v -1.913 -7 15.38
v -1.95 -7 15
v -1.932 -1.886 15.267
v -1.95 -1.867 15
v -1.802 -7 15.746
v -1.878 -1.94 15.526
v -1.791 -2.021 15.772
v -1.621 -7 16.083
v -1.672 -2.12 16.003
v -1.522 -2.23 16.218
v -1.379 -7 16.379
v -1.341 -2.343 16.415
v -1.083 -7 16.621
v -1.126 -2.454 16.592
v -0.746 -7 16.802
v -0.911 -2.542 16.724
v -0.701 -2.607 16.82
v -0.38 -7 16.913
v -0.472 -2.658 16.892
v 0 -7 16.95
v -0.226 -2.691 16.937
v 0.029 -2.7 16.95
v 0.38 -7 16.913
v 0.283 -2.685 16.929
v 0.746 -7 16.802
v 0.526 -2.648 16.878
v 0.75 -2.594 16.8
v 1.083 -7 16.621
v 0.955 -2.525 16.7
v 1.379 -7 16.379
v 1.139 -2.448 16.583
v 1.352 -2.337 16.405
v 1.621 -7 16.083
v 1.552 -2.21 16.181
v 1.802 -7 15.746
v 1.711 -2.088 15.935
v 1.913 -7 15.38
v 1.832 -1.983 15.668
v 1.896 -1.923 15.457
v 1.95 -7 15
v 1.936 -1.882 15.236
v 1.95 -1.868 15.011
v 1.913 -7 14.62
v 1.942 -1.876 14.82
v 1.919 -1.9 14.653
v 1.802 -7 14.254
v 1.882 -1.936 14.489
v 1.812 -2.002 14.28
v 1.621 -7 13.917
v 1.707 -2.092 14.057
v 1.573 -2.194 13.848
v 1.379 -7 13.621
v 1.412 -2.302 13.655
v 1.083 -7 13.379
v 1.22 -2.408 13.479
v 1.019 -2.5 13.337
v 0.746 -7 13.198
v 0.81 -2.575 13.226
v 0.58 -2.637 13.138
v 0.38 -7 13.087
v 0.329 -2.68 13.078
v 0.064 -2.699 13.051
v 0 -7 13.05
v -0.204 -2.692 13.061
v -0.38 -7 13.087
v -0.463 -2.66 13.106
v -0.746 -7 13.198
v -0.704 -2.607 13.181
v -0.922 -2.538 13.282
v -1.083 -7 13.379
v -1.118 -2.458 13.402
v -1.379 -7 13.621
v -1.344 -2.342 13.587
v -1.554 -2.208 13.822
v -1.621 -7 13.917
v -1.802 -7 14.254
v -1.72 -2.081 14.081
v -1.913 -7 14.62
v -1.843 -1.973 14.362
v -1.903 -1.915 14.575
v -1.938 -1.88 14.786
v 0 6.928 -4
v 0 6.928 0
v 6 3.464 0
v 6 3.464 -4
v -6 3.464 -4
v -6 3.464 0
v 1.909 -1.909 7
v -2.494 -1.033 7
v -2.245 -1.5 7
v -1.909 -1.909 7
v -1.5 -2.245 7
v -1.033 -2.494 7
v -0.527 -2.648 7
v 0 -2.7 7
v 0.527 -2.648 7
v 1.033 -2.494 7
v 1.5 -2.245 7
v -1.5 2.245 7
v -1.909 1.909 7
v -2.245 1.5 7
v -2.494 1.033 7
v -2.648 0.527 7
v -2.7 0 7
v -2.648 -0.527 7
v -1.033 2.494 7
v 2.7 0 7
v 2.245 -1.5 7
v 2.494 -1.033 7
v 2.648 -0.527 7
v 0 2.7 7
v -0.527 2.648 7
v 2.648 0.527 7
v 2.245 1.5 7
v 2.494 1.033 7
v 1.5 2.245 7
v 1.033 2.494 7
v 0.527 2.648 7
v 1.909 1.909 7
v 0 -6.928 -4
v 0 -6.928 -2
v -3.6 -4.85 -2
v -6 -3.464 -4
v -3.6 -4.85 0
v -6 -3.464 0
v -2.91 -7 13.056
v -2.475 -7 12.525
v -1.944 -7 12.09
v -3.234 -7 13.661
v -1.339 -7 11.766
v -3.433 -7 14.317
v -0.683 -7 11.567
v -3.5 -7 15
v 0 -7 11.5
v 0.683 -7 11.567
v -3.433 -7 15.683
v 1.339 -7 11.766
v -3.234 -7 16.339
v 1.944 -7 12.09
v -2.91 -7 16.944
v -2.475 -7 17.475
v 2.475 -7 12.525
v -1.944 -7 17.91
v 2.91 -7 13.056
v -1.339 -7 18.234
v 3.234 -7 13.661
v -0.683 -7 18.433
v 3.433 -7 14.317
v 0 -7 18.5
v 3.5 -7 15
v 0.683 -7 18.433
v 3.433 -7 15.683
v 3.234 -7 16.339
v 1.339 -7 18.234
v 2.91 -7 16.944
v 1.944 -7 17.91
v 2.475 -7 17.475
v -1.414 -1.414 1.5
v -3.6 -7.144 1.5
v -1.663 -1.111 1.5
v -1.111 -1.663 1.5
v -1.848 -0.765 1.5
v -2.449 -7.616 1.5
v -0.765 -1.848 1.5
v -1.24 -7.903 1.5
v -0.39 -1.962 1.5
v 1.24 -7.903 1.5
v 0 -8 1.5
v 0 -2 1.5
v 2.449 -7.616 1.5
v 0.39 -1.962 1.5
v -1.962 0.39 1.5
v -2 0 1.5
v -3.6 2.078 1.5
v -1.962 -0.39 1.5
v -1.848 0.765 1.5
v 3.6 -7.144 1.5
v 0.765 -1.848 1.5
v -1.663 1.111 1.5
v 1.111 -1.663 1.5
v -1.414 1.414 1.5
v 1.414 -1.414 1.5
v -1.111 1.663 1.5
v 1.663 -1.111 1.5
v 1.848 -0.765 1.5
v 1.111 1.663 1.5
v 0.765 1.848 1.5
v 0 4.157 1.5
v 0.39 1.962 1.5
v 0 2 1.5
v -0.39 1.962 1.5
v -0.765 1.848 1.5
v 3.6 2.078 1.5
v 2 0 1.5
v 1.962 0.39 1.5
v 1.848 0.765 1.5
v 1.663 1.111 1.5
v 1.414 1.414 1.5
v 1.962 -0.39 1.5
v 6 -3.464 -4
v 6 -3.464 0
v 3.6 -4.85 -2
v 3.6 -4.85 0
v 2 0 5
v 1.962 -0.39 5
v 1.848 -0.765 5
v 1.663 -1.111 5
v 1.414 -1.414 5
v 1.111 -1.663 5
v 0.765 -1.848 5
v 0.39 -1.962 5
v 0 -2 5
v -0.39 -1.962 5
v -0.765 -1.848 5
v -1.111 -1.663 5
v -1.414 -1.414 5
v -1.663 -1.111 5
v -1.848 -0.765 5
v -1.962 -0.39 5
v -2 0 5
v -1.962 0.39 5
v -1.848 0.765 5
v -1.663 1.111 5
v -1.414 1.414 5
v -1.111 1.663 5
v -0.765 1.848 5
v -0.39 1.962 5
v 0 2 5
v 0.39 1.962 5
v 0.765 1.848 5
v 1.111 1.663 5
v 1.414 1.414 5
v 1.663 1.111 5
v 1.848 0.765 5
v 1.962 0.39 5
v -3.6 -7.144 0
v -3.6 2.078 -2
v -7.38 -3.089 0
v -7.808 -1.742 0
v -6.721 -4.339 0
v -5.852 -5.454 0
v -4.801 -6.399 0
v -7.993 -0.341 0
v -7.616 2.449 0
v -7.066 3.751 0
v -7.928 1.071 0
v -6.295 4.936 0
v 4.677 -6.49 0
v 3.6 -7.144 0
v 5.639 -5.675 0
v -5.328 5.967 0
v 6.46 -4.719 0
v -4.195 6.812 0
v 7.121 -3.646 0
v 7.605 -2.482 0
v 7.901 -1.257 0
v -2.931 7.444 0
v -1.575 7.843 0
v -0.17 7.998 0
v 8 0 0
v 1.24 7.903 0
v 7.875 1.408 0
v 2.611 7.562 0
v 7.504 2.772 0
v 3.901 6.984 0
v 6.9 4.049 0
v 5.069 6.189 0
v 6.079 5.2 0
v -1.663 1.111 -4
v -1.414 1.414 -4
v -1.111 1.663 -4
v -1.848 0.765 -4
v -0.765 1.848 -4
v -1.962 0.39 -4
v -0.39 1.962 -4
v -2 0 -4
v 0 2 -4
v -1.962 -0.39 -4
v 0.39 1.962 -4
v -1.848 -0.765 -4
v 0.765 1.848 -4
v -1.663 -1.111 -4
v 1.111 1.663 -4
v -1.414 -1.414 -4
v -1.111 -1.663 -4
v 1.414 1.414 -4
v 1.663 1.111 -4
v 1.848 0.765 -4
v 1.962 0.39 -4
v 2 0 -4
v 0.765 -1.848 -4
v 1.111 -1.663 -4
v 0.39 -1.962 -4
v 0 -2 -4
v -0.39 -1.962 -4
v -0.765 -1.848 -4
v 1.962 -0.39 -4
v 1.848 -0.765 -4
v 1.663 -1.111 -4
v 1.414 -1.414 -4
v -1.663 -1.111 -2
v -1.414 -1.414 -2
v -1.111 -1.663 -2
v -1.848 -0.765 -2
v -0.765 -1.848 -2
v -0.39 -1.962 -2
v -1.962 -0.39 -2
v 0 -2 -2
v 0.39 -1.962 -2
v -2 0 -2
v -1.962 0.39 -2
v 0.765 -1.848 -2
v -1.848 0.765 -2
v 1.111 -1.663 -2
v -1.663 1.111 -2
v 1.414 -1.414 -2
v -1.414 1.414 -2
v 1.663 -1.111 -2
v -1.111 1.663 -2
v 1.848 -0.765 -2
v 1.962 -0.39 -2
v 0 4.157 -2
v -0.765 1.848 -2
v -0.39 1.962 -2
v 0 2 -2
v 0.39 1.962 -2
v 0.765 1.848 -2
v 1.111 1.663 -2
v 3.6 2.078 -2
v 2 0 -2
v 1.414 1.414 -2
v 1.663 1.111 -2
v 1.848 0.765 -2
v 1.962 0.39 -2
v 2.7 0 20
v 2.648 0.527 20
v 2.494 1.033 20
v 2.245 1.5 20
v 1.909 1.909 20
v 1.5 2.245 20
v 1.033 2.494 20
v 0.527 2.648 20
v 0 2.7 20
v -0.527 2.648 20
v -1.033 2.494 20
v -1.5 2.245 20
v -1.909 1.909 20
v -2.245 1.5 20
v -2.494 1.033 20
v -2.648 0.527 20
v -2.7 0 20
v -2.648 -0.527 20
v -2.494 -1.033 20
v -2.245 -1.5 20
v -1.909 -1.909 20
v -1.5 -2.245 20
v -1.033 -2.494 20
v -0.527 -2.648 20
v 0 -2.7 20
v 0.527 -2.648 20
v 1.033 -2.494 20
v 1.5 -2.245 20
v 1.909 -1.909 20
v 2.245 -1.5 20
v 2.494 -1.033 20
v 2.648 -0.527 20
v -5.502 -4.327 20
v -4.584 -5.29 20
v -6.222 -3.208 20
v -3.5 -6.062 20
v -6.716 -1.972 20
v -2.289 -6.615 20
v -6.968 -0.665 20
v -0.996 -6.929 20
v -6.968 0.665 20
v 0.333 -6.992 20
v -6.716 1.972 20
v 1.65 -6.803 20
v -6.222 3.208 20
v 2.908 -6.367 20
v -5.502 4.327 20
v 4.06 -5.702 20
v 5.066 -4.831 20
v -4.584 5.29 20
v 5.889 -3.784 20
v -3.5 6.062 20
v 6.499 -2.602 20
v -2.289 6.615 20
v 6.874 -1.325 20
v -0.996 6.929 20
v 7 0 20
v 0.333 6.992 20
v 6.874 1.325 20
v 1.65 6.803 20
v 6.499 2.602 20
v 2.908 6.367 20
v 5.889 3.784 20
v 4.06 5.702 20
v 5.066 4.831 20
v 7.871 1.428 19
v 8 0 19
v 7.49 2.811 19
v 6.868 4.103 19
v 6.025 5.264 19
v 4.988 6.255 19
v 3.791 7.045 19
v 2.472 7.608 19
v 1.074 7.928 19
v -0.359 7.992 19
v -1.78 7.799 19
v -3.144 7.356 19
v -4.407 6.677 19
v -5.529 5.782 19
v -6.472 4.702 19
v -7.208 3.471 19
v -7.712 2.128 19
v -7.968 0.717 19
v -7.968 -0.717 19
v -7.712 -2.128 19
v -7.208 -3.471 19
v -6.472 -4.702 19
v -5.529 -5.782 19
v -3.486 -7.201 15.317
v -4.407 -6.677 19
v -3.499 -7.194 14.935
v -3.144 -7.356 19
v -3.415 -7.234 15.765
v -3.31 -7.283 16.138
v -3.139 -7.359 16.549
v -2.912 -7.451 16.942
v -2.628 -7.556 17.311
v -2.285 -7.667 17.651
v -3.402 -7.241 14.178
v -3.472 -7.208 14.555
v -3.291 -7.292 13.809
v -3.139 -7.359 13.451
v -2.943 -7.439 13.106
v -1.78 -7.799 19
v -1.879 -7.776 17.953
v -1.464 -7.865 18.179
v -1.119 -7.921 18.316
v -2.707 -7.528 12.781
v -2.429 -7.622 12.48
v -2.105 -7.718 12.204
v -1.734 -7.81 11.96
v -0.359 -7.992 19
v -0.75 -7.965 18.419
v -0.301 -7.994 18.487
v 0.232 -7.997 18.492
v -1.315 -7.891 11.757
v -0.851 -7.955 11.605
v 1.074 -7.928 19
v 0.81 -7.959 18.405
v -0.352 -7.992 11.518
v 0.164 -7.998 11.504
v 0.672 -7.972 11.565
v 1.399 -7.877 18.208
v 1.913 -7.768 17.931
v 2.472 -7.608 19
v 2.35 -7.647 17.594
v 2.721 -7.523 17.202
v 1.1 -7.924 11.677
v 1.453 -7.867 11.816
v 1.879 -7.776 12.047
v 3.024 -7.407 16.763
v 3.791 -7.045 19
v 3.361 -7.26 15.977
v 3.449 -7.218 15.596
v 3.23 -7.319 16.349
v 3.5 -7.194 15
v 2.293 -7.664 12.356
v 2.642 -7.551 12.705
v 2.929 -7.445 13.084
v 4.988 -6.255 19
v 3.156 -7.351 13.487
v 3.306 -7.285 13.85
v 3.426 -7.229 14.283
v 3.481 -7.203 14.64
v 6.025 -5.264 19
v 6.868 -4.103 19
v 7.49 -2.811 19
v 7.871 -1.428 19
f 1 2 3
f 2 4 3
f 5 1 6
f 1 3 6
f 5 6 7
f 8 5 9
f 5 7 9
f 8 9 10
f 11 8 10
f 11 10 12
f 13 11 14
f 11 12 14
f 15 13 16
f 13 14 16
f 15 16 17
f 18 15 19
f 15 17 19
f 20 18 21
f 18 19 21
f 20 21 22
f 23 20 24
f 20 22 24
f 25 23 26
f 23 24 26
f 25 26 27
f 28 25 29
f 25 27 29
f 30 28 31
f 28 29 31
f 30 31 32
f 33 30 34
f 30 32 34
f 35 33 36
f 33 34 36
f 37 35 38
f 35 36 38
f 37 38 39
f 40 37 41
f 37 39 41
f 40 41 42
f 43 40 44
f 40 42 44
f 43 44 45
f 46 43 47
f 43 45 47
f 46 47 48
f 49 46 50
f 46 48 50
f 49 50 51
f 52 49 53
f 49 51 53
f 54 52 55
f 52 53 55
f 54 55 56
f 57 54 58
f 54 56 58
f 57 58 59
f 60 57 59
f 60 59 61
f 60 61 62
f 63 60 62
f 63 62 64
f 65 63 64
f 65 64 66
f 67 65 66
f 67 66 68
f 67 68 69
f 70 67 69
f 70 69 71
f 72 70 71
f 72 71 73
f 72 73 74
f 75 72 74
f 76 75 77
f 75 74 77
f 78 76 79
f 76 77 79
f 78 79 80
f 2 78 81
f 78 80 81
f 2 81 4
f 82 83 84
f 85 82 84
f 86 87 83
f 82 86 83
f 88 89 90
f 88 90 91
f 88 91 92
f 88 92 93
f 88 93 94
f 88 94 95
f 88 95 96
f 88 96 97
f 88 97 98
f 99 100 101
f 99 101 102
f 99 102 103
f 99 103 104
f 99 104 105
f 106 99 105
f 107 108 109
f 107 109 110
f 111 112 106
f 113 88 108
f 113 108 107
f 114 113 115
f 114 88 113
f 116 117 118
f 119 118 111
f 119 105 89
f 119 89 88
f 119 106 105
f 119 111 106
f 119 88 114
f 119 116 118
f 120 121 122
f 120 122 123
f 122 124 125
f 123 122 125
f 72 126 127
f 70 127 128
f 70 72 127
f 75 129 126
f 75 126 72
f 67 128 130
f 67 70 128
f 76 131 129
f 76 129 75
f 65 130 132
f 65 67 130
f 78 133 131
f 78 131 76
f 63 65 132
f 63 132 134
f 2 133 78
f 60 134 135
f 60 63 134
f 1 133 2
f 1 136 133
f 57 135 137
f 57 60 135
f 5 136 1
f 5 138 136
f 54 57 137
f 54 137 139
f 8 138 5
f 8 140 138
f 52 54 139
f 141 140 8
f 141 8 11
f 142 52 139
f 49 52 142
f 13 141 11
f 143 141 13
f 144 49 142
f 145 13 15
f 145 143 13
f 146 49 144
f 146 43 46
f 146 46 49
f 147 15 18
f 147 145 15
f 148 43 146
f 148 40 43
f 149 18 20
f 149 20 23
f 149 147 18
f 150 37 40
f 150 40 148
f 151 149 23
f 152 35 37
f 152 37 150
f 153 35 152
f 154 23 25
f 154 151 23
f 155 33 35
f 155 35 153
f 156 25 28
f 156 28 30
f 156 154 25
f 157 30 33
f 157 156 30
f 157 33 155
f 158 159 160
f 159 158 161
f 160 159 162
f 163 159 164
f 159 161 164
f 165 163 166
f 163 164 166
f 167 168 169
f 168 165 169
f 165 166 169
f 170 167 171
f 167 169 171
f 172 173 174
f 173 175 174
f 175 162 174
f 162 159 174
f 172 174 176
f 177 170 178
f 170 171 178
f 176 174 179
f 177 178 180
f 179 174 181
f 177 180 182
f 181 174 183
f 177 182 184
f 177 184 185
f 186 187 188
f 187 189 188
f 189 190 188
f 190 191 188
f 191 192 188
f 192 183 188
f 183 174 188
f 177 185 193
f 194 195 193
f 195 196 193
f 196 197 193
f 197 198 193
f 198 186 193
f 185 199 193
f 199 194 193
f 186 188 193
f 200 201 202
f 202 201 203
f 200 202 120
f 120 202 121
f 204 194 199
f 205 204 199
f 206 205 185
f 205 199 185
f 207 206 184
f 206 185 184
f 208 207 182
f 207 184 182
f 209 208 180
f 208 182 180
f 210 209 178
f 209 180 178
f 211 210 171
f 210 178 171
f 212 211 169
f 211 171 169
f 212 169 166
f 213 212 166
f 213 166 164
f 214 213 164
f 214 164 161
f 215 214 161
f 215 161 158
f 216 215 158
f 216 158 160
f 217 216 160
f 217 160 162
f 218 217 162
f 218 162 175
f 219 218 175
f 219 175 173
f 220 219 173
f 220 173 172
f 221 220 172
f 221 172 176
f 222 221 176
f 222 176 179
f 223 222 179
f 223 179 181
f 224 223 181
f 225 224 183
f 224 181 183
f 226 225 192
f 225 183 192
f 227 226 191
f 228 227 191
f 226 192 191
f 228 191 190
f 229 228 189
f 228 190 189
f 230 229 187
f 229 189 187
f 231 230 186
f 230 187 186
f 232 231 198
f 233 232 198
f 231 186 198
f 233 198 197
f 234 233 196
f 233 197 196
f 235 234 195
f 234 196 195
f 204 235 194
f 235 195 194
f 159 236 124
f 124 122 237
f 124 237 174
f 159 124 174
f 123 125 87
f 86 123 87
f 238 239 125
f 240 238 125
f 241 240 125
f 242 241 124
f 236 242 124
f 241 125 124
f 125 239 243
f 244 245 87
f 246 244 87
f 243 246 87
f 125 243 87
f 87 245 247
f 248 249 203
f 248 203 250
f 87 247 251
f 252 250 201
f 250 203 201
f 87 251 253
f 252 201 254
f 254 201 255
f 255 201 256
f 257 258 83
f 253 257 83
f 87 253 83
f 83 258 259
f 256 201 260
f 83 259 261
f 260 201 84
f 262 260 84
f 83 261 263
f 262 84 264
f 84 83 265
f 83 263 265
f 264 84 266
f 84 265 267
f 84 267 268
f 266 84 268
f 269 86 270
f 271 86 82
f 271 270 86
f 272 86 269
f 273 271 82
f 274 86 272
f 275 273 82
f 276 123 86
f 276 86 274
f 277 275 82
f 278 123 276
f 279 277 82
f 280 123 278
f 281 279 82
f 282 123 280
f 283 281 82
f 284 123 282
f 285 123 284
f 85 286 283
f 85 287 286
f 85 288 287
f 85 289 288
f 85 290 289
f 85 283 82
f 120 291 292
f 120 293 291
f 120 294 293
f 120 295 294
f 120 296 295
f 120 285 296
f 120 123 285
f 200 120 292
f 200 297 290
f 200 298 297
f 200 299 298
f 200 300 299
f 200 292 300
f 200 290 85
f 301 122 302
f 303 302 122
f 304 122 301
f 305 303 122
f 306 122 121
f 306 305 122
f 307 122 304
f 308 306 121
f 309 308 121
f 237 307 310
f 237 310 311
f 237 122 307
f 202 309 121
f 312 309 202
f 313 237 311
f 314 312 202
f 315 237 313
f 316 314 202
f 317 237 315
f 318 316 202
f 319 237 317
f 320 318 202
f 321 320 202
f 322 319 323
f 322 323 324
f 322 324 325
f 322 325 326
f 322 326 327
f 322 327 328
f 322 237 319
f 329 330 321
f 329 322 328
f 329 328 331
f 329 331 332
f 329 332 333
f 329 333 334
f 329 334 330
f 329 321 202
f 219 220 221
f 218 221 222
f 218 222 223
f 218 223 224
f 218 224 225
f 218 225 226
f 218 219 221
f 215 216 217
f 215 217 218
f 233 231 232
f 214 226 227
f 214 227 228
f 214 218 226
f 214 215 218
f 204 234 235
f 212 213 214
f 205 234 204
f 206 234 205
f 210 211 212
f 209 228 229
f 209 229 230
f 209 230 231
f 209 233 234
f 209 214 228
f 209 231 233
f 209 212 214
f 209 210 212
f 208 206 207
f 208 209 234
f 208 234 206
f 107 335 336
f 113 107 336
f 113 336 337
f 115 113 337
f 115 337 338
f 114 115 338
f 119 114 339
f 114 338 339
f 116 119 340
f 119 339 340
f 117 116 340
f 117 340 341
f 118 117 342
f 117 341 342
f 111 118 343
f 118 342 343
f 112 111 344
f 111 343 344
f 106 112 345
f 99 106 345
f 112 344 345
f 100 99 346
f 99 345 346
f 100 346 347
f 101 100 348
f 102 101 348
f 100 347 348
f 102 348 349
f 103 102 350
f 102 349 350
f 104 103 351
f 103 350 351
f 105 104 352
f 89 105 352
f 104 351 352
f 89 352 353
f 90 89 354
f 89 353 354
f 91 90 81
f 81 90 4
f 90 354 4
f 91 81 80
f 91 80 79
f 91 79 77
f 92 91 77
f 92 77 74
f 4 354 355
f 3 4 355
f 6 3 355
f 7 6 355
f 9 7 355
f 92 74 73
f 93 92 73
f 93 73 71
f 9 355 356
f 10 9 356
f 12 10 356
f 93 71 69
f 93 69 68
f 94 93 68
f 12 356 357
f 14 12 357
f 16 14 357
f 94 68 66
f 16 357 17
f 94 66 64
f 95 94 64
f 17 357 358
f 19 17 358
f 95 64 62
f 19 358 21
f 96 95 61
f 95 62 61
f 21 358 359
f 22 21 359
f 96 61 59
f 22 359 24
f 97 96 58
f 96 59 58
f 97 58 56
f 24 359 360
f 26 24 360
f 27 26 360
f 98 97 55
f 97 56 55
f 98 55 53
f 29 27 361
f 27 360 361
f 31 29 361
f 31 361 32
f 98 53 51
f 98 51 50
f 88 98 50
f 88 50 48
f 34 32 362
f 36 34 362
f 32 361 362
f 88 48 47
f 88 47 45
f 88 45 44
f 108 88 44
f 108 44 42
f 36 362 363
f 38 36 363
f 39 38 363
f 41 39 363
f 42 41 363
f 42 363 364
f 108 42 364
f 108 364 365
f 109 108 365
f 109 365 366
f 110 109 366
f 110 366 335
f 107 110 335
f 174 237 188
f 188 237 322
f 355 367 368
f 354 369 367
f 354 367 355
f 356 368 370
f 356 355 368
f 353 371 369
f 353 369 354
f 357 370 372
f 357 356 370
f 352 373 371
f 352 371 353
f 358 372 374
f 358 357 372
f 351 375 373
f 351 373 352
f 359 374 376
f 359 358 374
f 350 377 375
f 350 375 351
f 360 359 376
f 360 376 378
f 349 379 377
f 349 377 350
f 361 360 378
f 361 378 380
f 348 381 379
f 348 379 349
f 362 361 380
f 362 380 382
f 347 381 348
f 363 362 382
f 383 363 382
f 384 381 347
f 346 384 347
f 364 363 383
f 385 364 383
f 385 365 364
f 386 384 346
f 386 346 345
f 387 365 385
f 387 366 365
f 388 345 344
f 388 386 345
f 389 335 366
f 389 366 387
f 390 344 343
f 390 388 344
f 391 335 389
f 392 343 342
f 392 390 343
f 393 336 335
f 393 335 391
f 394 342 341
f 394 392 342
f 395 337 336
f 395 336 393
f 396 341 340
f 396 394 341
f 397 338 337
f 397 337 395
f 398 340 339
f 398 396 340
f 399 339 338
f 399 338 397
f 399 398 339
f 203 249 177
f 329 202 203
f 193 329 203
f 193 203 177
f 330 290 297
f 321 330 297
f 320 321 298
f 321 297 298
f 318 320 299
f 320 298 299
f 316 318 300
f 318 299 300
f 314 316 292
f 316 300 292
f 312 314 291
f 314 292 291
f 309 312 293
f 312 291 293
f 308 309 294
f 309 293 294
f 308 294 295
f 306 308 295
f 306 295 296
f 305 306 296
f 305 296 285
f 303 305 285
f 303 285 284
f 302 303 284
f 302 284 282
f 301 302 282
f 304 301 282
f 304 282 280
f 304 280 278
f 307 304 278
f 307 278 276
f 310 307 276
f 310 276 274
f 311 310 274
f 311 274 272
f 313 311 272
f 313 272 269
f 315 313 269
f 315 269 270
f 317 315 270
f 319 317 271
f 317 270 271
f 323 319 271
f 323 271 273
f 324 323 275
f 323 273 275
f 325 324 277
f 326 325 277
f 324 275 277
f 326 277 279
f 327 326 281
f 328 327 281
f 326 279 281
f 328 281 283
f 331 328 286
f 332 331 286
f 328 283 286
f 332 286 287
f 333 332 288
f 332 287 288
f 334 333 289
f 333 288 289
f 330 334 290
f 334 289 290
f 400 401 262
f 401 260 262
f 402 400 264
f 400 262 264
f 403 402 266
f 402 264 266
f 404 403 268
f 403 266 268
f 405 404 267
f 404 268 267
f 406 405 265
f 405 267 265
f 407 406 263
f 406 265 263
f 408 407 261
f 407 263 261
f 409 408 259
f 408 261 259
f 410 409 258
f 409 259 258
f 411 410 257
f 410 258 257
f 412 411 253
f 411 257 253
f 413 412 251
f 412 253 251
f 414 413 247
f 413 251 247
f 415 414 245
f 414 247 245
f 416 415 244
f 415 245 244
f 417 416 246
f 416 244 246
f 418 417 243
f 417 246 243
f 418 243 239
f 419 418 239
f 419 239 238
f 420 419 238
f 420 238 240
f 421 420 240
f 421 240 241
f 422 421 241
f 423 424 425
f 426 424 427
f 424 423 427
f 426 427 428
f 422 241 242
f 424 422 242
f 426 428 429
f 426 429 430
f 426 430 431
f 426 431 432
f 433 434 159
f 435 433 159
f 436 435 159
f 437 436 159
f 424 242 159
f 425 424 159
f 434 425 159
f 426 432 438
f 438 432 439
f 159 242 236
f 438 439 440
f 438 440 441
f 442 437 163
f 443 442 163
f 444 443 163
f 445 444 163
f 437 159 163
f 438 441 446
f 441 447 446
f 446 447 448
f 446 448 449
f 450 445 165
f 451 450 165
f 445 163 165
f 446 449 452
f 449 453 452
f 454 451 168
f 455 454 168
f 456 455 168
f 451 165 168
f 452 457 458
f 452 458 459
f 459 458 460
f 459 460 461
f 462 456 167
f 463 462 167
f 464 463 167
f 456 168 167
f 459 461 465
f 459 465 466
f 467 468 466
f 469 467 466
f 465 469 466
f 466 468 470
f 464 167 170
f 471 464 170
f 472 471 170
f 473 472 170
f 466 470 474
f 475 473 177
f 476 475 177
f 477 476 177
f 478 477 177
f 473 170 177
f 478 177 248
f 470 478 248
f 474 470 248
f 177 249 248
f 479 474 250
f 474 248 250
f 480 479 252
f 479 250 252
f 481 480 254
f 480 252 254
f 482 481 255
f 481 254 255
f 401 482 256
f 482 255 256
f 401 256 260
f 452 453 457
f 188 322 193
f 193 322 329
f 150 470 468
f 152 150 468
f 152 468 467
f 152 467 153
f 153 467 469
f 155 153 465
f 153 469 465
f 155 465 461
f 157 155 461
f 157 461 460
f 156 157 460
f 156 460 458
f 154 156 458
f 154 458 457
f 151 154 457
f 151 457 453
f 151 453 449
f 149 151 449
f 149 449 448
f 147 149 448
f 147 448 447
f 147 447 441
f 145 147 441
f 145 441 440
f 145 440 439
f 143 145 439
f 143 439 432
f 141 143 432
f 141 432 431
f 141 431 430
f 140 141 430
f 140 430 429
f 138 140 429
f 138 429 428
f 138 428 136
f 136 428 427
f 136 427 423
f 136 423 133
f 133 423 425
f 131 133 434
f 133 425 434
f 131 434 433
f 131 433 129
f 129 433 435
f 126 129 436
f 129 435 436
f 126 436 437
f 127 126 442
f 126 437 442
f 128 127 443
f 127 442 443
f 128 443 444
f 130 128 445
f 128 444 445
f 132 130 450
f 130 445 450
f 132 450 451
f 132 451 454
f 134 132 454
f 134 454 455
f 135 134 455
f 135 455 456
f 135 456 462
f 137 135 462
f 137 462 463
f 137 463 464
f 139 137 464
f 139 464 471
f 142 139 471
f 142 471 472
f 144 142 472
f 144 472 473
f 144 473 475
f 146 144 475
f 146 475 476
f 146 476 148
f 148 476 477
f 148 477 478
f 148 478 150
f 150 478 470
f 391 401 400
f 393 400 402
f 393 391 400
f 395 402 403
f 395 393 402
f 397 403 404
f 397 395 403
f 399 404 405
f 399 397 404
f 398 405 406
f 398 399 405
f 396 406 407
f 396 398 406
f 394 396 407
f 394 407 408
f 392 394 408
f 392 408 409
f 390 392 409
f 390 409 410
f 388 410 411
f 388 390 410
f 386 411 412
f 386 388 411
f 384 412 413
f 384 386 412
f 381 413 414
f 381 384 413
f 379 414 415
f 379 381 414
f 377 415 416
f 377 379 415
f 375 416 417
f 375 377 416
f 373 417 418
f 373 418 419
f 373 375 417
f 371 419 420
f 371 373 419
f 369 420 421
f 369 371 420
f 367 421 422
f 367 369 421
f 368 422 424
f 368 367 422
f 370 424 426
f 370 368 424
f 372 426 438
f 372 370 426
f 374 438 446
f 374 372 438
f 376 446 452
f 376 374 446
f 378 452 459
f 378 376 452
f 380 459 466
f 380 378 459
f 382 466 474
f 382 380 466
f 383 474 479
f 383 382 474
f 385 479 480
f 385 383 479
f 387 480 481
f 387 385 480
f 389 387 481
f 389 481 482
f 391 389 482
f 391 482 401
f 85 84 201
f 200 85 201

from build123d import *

# Parameters (mm, degrees)
F1_R            = 8
F2_DEPTH        = 20
F4_DEPTH        = 4
F5_R            = 2
F6_DEPTH        = 9
F9_DEPTH        = 3.5
F10_W           = 7.2
F10_H           = 3.5
F11_DEPTH       = 9
F12_SIZE        = 1
F13_R           = 2.7
F14_DEPTH       = 13
F17_D           = 3.9
F17_DEPTH       = 9
F17_CBORE_D     = 7
F17_CBORE_DEPTH = 1
F17_TIP         = 1.1716782071


with BuildPart() as f2:
    # F1 (on Top) → F2 (new body)
    with BuildSketch(Plane.XY):
        Circle(F1_R)
    extrude(amount=F2_DEPTH)

    # F3 (on face) → F4 (join)
    with BuildSketch(Plane(origin=(0, 0, 0), x_dir=(1, 0, 0), z_dir=(0, 0, -1))):
        Polygon((-6, 3.4641016151), (-6, -3.4641016151), (0, -6.9282032303), (6, -3.4641016151), (6, 3.4641016151), (0, 6.9282032303), align=None)
    extrude(amount=F4_DEPTH)

    # F5 (on face) → F6 (cut)
    with BuildSketch(Plane(origin=(0, 0, -4), x_dir=(1, 0, 0), z_dir=(0, 0, -1))):
        Circle(F5_R)
    extrude(amount=-F6_DEPTH, mode=Mode.SUBTRACT)

    # F8 (on offset) → F9 (cut)
    with BuildSketch(Plane(origin=(0, 0, -2), x_dir=(1, 0, 0), z_dir=(0, 0, -1))):
        Polygon((3.6, -2.0784609691), (3.6, 2.0784609691), (0, 4.1569219382), (-3.6, 2.0784609691), (-3.6, -2.0784609691), (0, -4.1569219382), align=None)
    extrude(amount=-F9_DEPTH, mode=Mode.SUBTRACT)

    # F10 (on Front) → F11 (cut)
    with BuildSketch(Plane.XZ):
        with Locations((0, -0.25)):
            Rectangle(F10_W, F10_H)
    extrude(amount=F11_DEPTH, mode=Mode.SUBTRACT)

    # F12
    f12_edges = [f2.edges().sort_by_distance(p)[0] for p in [
        (-8, 0, 20),
    ]]
    chamfer(f12_edges, length=F12_SIZE)

    # F13 (on face) → F14 (cut)
    with BuildSketch(Plane.XY.offset(20)):
        Circle(F13_R)
    extrude(amount=-F14_DEPTH, mode=Mode.SUBTRACT)

    # F17
    with Locations(Plane.XZ.offset(8)):
        with Locations((0, 15)):
            CounterBoreHole(F17_D / 2, F17_CBORE_D / 2, F17_CBORE_DEPTH, depth=F17_DEPTH)
            with Locations((0, 0, -(F17_DEPTH + F17_TIP / 2))):  # 118° drill point
                Cone(0, F17_D / 2, F17_TIP, mode=Mode.SUBTRACT)


solid = f2.part
